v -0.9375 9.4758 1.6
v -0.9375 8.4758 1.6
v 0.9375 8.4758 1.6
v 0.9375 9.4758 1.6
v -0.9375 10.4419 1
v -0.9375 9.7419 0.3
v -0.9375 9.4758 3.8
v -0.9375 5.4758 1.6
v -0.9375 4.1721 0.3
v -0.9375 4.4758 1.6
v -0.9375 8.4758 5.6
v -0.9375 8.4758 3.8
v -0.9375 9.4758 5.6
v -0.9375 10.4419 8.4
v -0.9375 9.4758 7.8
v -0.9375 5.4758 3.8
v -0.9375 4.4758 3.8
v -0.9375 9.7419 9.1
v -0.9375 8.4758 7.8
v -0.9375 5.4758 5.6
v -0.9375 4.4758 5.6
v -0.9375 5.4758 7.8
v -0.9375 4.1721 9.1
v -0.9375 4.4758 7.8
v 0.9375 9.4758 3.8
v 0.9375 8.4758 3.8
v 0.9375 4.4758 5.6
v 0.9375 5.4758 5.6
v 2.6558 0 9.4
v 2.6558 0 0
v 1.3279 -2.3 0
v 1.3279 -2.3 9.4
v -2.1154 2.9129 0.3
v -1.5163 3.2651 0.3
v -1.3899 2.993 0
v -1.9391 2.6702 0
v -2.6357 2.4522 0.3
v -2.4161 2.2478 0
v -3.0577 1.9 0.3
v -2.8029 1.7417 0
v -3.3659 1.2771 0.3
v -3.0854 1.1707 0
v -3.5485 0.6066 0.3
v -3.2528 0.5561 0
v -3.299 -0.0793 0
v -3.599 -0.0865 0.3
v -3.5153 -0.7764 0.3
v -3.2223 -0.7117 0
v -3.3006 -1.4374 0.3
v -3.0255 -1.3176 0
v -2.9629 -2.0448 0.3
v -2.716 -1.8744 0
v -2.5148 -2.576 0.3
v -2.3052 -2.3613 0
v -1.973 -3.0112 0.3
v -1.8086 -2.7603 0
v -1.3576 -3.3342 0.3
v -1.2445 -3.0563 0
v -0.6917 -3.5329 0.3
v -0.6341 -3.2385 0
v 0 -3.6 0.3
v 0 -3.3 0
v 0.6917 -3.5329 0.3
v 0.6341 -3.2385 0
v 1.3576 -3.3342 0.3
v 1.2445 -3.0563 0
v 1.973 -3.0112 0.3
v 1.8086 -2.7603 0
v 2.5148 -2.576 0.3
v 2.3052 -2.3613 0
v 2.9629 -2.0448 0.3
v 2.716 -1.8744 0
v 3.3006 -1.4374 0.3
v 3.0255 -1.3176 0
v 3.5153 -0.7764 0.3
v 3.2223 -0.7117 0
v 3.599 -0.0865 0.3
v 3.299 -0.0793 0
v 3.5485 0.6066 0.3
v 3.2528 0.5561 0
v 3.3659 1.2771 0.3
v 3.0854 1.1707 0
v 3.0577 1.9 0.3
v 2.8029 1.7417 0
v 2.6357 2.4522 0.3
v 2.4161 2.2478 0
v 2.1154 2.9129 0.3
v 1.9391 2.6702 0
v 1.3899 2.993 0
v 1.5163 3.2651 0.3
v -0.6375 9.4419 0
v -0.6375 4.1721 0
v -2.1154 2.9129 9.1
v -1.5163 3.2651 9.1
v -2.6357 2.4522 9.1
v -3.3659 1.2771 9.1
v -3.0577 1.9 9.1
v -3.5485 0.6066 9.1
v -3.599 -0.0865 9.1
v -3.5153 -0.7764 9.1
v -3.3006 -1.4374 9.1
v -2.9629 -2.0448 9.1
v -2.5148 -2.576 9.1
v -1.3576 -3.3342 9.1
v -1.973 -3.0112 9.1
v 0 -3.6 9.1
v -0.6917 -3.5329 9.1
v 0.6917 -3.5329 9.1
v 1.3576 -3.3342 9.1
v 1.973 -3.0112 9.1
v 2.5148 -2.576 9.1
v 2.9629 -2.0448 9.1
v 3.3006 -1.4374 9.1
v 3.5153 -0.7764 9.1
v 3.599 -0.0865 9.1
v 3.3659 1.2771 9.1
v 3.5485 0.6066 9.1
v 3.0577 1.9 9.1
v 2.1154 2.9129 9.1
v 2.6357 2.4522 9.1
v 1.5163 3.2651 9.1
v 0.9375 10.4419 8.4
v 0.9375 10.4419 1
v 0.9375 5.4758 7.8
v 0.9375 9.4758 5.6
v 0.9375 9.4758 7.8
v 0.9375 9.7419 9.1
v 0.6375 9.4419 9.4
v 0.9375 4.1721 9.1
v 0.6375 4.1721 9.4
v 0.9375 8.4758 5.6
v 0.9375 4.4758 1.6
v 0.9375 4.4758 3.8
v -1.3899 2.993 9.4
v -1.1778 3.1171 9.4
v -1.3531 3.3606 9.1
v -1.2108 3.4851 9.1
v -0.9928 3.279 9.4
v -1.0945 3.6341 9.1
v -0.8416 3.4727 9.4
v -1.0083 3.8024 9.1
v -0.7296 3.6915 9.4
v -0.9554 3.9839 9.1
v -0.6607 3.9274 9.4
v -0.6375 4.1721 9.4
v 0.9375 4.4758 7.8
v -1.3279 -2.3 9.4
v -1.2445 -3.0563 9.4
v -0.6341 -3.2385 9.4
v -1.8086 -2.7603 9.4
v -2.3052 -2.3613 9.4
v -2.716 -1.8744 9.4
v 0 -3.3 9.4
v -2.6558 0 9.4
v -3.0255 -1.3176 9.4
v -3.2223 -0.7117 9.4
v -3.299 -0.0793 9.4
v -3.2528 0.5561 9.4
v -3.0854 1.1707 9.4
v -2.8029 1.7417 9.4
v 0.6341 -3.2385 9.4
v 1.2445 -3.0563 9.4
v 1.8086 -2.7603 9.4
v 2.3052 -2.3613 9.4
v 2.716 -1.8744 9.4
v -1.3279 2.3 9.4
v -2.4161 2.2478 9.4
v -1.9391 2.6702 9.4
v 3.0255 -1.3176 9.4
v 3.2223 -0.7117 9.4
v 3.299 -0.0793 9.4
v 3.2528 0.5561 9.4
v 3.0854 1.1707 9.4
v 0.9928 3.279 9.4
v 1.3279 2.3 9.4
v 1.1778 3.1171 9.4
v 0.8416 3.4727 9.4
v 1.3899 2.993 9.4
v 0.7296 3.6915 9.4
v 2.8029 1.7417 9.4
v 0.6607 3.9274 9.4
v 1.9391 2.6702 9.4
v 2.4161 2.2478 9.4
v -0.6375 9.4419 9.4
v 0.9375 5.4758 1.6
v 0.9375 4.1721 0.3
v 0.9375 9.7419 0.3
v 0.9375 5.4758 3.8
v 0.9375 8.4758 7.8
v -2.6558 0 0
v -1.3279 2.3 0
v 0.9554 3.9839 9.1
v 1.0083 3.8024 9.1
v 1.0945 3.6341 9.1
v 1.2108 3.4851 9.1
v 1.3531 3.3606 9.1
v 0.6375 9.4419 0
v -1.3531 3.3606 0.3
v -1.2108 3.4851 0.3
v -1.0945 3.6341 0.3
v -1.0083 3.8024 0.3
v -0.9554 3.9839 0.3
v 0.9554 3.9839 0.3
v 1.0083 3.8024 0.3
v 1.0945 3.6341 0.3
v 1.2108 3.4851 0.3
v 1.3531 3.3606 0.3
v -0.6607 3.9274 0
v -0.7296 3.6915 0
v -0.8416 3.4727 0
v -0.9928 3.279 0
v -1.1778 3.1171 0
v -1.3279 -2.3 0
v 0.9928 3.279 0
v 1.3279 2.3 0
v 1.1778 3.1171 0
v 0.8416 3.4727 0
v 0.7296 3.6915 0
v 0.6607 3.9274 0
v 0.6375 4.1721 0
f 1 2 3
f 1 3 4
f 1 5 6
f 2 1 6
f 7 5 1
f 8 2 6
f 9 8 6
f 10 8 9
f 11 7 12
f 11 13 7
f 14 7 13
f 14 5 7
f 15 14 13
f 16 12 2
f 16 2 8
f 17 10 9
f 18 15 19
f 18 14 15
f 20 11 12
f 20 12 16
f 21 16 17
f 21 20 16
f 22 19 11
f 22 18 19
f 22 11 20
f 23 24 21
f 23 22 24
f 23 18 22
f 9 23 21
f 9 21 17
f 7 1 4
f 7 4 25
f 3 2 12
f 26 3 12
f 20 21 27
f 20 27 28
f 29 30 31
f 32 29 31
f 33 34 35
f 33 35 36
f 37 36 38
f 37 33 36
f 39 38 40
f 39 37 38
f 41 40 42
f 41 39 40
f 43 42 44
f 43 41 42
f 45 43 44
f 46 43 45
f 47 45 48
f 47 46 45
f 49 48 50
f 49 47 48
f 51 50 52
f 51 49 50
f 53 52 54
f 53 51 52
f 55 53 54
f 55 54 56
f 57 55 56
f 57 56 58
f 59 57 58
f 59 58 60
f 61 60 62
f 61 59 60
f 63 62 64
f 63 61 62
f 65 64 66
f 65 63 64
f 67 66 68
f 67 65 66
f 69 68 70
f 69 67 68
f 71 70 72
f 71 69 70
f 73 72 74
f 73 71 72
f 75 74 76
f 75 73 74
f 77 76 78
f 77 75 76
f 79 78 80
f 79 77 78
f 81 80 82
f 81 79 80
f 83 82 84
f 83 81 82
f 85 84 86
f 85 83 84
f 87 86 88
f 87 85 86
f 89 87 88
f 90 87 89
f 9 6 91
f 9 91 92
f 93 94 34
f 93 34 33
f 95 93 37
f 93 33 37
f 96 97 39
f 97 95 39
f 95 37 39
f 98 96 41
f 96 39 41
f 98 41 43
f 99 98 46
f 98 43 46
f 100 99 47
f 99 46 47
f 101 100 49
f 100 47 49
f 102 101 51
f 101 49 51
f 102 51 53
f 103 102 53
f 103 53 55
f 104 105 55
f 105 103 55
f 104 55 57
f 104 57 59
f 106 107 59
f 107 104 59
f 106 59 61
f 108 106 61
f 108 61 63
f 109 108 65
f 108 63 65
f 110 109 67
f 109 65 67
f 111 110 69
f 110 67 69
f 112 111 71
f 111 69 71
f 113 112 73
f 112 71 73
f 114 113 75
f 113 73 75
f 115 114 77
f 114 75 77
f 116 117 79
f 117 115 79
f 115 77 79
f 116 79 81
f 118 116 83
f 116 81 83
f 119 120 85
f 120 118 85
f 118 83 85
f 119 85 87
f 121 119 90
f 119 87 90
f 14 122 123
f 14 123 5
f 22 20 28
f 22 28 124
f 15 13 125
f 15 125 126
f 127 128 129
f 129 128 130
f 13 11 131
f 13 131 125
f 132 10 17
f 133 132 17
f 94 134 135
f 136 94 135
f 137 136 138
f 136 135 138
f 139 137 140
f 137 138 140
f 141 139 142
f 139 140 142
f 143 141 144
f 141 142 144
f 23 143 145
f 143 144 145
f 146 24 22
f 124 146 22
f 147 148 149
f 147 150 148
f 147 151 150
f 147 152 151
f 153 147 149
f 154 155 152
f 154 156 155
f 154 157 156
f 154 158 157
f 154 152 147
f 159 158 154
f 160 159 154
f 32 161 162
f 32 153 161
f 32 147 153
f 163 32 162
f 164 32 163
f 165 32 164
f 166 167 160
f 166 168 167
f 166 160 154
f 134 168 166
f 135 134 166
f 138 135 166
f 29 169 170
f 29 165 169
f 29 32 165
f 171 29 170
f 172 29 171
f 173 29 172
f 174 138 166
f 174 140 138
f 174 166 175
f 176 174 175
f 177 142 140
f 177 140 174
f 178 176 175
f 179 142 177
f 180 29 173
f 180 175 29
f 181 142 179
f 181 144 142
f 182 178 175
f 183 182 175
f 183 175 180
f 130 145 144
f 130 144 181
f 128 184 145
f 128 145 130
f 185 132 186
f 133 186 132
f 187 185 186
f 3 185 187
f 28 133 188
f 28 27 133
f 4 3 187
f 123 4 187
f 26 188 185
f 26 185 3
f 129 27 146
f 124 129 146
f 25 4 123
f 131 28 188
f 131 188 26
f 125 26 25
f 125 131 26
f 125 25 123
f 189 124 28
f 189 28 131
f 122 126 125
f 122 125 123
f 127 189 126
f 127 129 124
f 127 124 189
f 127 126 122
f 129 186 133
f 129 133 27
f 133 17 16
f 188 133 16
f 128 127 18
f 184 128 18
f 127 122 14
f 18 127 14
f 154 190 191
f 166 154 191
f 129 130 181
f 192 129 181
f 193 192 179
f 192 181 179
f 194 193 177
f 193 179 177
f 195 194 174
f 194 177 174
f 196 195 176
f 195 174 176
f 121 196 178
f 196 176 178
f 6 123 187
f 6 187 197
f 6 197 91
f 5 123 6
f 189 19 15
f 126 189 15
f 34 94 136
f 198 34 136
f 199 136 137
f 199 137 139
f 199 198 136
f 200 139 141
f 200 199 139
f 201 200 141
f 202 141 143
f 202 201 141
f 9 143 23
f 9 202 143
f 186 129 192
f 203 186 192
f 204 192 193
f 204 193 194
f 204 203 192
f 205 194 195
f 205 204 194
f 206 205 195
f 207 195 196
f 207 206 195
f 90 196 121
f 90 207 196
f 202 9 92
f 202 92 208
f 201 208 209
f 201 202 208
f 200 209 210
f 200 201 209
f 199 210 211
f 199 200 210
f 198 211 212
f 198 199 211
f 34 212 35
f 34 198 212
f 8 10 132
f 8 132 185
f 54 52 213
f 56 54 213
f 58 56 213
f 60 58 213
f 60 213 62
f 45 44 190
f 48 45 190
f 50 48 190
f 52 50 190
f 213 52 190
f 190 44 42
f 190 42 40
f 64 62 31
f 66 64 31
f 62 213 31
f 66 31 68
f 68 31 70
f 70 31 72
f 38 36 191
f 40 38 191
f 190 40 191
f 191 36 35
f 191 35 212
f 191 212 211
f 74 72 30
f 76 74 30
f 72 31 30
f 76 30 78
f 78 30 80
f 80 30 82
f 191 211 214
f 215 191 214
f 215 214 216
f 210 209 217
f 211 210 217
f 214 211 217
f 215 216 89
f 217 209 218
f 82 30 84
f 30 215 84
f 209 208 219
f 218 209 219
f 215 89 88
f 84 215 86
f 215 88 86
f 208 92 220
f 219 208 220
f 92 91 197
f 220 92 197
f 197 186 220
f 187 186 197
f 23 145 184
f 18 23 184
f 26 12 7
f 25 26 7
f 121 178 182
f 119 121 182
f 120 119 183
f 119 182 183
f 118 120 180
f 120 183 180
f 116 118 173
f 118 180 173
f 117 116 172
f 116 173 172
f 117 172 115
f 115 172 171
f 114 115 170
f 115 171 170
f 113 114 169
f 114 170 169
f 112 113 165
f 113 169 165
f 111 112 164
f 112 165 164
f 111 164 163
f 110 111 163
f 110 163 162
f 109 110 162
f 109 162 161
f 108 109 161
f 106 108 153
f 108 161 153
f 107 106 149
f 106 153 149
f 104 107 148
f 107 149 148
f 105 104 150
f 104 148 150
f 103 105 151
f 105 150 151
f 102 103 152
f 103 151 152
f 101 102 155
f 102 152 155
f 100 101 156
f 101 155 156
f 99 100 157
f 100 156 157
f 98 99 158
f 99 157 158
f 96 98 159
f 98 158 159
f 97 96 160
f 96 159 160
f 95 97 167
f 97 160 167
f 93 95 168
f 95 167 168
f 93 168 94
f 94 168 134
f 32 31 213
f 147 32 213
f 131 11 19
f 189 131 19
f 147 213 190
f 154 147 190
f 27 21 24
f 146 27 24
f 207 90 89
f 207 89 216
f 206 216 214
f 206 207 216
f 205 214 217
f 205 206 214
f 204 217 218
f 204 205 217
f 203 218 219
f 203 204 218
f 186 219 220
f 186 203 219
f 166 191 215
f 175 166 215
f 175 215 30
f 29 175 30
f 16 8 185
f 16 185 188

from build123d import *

# Parameters (mm, degrees)
SKETCH2_R           = 3.6
SKETCH2_R_2         = 1.625
BOSS_EXTRUDE1_DEPTH = 9.4
BOSS_EXTRUDE2_DEPTH = 9.4
SKETCH4_W           = 2.2
SKETCH4_H           = 1
CUT_EXTRUDE2_DEPTH  = 10
CHAMFER2_SIZE       = 1
FILLET1_R           = 1
CUT_EXTRUDE3_DEPTH  = 10
CHAMFER1_SIZE       = 0.3


with BuildPart() as part:
    # Sketch2 → Boss-Extrude1 (new body)
    with BuildSketch(Plane.XY):
        Circle(SKETCH2_R)
        Circle(SKETCH2_R_2, mode=Mode.SUBTRACT)
    extrude(amount=BOSS_EXTRUDE1_DEPTH)

    # Sketch3 → Boss-Extrude2 (add)
    with BuildSketch(Plane.XY.offset(9.4)):
        with BuildLine():
            Line((-0.9375, 10.44191444), (-0.9375, 3.475786781))
            ThreePointArc((-0.9375, 3.475786781), (0, 3.6), (0.9375, 3.475786781))
            Line((0.9375, 3.475786781), (0.9375, 10.44191444))
            Line((0.9375, 10.44191444), (-0.9375, 10.44191444))
        make_face()
    extrude(amount=-BOSS_EXTRUDE2_DEPTH)

    # Sketch4 → Cut-Extrude2 (cut)
    with BuildSketch(Plane.ZY.offset(0.9375)):
        with Locations((2.7, 8.975786781)):
            Rectangle(SKETCH4_W, SKETCH4_H)
        with Locations((6.7, 8.975786781)):
            Rectangle(SKETCH4_W, SKETCH4_H)
        with Locations((2.7, 4.975786781)):
            Rectangle(SKETCH4_W, SKETCH4_H)
        with Locations((6.7, 4.975786781)):
            Rectangle(SKETCH4_W, SKETCH4_H)
    extrude(amount=-CUT_EXTRUDE2_DEPTH, mode=Mode.SUBTRACT)

    # Chamfer2
    chamfer2_edges = [part.edges().sort_by_distance(p)[0] for p in [
        (0, 10.44191444, 0),
        (0, 10.44191444, 9.4),
    ]]
    chamfer(chamfer2_edges, length=CHAMFER2_SIZE)

    # Fillet1
    fillet1_edges = [part.edges().sort_by_distance(p)[0] for p in [
        (0.9375, 3.475786781, 4.7),
        (-0.9375, 3.475786781, 4.7),
    ]]
    fillet(fillet1_edges, radius=FILLET1_R)

    # Sketch5 → Cut-Extrude3 (cut)
    with BuildSketch(Plane(origin=(0, 0, 0), x_dir=(-1, 0, 0), z_dir=(0, 0, -1))):
        Polygon((1.327905619, 2.3), (-1.327905619, 2.3), (-2.655811238, 0), (-1.327905619, -2.3), (1.327905619, -2.3), (2.655811238, 0), align=None)
    extrude(amount=-CUT_EXTRUDE3_DEPTH, mode=Mode.SUBTRACT)

    # Chamfer1
    chamfer1_edges = [part.edges().sort_by_distance(p)[0] for p in [
        (0.9375, 6.806987766, 0),
        (-0.9375, 6.806987766, 0),
        (0, -3.6, 0),
        (0, -3.6, 9.4),
        (0.9375, 6.806987766, 9.4),
        (-0.9375, 6.806987766, 9.4),
        (1.094530353, 3.634099965, 9.4),
        (1.094530353, 3.634099965, 0),
        (-1.094530353, 3.634099965, 9.4),
        (-1.094530353, 3.634099965, 0),
    ]]
    chamfer(chamfer1_edges, length=CHAMFER1_SIZE)


solid = part.part
